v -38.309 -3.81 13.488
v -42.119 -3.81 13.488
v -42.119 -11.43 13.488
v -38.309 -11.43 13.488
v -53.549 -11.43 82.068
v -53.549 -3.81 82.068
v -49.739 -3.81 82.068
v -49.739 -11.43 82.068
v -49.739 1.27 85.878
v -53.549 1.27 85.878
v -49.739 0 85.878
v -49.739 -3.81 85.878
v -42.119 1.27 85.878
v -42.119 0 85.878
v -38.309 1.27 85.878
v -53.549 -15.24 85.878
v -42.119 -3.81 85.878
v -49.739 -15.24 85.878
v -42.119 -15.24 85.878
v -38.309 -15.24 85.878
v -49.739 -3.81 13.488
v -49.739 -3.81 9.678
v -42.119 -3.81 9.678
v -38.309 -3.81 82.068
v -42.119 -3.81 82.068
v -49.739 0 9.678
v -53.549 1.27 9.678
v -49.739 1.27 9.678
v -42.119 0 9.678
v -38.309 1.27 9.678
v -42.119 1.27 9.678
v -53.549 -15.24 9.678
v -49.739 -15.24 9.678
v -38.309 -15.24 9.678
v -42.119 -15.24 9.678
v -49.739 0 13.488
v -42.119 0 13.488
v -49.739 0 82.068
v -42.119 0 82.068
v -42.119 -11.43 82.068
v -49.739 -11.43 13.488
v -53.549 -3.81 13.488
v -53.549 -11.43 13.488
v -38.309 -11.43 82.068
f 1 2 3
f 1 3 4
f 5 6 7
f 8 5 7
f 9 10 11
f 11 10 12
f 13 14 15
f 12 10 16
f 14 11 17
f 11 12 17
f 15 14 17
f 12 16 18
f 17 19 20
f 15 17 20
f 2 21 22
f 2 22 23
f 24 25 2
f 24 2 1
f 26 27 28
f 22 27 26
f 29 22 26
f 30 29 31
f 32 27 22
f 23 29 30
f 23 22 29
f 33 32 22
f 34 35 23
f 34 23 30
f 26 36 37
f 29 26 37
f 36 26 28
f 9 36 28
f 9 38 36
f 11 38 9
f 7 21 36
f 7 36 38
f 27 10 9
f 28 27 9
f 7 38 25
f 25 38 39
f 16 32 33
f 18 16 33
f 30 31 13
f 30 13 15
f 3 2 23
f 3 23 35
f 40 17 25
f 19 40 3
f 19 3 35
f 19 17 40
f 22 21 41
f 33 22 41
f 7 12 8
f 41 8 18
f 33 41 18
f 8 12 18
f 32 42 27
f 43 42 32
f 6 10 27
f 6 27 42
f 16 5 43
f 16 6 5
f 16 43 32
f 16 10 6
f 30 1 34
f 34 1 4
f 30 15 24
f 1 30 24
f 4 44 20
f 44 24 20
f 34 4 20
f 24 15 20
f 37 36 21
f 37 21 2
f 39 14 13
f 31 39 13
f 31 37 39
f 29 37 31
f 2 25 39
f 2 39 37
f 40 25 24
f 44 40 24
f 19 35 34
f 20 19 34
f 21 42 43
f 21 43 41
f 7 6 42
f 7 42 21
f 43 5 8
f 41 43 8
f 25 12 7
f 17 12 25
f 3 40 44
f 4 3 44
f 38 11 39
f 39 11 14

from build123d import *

# Parameters (mm, degrees)
F0_W     = 3.81
F0_H     = 3.81
F0_W_2   = 7.62
F0_H_2   = 68.58
F1_DEPTH = 3.81
F2_DEPTH = 1.27
F3_DEPTH = 15.24
F4_W     = 3.81
F4_H     = 3.81
F5_DEPTH = 68.58
F6_W     = 3.81
F6_H     = 3.81
F7_DEPTH = 68.58


with BuildPart() as f1:
    # F0 (on Front) → F1 (new body)
    with BuildSketch(Plane.XZ):
        with Locations((-51.6441376173, 83.97309774)):
            Rectangle(F0_W, F0_H)
        with Locations((-45.9291376173, 83.97309774)):
            Rectangle(F0_W_2, F0_H)
        with Locations((-40.2141376173, 83.97309774)):
            Rectangle(F0_W, F0_H)
        with Locations((-40.2141376173, 47.77809774)):
            Rectangle(F0_W, F0_H_2)
        with Locations((-51.6441376173, 47.77809774)):
            Rectangle(F0_W, F0_H_2)
        with Locations((-51.6441376173, 11.58309774)):
            Rectangle(F0_W, F0_H)
        with Locations((-45.9291376173, 11.58309774)):
            Rectangle(F0_W_2, F0_H)
        with Locations((-40.2141376173, 11.58309774)):
            Rectangle(F0_W, F0_H)
    extrude(amount=F1_DEPTH)

    # F0 (on Front) → F2 (join)
    with BuildSketch(Plane.XZ):
        with Locations((-51.6441376173, 47.77809774)):
            Rectangle(F0_W, F0_H_2)
        with Locations((-51.6441376173, 83.97309774)):
            Rectangle(F0_W, F0_H)
        with Locations((-40.2141376173, 83.97309774)):
            Rectangle(F0_W, F0_H)
        with Locations((-40.2141376173, 47.77809774)):
            Rectangle(F0_W, F0_H_2)
        with Locations((-40.2141376173, 11.58309774)):
            Rectangle(F0_W, F0_H)
        with Locations((-51.6441376173, 11.58309774)):
            Rectangle(F0_W, F0_H)
    extrude(amount=-F2_DEPTH)

    # F0 (on Front) → F3 (join)
    with BuildSketch(Plane.XZ):
        with Locations((-51.6441376173, 83.97309774)):
            Rectangle(F0_W, F0_H)
        with Locations((-40.2141376173, 83.97309774)):
            Rectangle(F0_W, F0_H)
        with Locations((-51.6441376173, 11.58309774)):
            Rectangle(F0_W, F0_H)
        with Locations((-40.2141376173, 11.58309774)):
            Rectangle(F0_W, F0_H)
    extrude(amount=F3_DEPTH)

    # F4 (on face) → F5 (join)
    with BuildSketch(Plane(origin=(0, 0, 82.06809774), x_dir=(1, 0, 0), z_dir=(0, 0, -1))):
        with Locations((-51.6441376173, 13.335)):
            Rectangle(F4_W, F4_H)
    extrude(amount=F5_DEPTH)

    # F6 (on face) → F7 (join)
    with BuildSketch(Plane(origin=(0, 0, 82.06809774), x_dir=(1, 0, 0), z_dir=(0, 0, -1))):
        with Locations((-40.2141376173, 13.335)):
            Rectangle(F6_W, F6_H)
    extrude(amount=F7_DEPTH)


solid = f1.part
